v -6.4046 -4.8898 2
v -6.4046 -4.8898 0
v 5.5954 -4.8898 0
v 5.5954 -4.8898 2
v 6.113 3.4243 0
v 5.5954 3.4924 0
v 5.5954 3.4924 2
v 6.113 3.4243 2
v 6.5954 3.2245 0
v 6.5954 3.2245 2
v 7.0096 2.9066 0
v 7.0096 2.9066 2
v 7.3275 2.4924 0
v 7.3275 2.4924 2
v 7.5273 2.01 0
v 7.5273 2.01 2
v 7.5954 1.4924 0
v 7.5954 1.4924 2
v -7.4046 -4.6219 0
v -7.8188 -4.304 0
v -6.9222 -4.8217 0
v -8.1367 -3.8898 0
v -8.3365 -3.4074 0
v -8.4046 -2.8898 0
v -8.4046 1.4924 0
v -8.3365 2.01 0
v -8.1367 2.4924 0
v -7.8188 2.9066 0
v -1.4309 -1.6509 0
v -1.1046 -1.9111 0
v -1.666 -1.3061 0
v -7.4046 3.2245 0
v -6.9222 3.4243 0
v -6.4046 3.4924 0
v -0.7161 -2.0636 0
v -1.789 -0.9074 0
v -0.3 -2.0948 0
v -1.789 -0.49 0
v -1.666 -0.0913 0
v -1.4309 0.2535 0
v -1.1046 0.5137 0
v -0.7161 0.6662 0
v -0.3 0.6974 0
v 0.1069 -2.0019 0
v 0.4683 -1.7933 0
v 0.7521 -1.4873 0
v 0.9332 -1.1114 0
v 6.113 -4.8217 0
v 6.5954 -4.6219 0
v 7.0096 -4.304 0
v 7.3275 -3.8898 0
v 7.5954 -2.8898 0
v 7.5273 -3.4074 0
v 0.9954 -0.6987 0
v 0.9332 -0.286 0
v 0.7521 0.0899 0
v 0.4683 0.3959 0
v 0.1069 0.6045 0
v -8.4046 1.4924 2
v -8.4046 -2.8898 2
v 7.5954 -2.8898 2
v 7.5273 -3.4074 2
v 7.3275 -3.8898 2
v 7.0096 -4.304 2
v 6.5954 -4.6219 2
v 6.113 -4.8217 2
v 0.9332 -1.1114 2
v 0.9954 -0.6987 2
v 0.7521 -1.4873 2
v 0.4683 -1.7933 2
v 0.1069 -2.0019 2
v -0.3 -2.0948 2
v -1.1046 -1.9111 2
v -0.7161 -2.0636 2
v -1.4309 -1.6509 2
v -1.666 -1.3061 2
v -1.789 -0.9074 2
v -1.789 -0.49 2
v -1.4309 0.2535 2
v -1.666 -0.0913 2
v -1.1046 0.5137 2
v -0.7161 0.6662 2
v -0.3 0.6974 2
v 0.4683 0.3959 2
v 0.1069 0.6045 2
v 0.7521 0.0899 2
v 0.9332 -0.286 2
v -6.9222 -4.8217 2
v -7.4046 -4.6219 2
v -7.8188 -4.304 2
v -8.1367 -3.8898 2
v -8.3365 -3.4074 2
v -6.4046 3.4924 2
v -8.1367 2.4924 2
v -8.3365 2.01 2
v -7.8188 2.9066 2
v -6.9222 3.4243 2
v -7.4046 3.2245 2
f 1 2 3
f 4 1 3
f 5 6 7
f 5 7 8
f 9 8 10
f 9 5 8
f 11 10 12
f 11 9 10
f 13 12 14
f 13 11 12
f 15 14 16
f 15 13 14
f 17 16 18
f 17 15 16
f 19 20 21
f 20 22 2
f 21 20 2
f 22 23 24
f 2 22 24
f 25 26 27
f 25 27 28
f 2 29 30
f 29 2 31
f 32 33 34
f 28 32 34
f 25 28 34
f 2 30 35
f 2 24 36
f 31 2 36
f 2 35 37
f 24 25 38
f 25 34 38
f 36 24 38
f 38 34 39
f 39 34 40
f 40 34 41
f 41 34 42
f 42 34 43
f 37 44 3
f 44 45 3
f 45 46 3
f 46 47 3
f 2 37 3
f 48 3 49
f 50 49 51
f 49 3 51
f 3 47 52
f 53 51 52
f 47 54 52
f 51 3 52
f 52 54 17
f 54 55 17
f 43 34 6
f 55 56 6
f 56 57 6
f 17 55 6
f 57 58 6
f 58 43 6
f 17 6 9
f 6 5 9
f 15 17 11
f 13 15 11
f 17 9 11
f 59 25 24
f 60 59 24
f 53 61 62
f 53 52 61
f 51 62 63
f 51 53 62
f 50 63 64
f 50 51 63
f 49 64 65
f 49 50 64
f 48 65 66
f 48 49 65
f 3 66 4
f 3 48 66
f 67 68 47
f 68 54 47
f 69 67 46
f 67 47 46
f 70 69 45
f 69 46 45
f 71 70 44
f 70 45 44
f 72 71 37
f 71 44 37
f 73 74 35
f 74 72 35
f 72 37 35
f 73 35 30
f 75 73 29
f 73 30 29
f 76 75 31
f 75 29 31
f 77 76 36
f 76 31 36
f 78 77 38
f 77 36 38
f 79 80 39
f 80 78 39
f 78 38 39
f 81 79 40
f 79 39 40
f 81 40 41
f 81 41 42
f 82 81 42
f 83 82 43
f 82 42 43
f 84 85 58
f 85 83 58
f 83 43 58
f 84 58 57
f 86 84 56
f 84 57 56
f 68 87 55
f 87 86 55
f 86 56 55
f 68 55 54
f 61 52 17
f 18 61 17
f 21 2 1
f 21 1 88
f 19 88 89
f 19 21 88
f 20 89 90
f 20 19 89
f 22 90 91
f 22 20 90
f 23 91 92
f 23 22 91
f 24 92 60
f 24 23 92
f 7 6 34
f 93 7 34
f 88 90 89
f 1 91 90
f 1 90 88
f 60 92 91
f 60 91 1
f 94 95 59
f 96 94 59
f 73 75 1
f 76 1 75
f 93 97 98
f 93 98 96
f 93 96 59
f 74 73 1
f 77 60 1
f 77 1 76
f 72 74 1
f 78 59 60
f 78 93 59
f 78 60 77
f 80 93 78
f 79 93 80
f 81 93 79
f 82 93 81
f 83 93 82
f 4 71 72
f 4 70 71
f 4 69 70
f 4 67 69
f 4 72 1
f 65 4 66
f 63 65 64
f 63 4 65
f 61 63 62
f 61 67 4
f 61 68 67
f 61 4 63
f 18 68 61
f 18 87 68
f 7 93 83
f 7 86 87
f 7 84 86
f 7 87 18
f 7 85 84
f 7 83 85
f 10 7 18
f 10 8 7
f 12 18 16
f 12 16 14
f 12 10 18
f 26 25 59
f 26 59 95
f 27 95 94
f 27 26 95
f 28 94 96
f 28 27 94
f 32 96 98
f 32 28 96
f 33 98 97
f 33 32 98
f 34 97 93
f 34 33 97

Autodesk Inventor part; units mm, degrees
ref_plane "YZ Plane" through (0, 0, 0) normal (1, 0, 0) x (0, 1, 0)
ref_plane "XZ Plane" through (0, 0, 0) normal (0, 1, 0) x (-1, 0, 0)
ref_plane "XY Plane" through (0, 0, 0) normal (0, 0, 1) x (1, 0, 0)
sketch "washer_sketch" plane through (0, 0, 0) normal (0, 0, 1) x (1, 0, 0)
  arc A0 (0.0668, 4.8898) -> (-1.1152, 4.3995) centre (0.2018, 2.8944) ccw construction
  line L0 (-7.8667, -1.508) -> (-1.1152, 4.3995) construction
  arc A1 (-7.8667, -1.508) -> (-8.5497, -3.0131) centre (-6.5497, -3.0131) ccw construction
  line L1 (-8.5497, -4.8898) -> (-8.5497, -3.0131) construction
  line L2 (8.5497, -4.8898) -> (-8.5497, -4.8898) construction
  line L3 (1.5081, 4.1255) -> (8.5497, -4.8898) construction
  arc A2 (1.5081, 4.1255) -> (0.0668, 4.8898) centre (-0.0681, 2.8944) ccw construction
  circle A3 centre (-0.4046, -0.6987) radius 3.55 construction
  circle A4 centre (-0.4046, -0.6987) radius 3.55 construction
  circle A5 centre (-0.4046, -0.6987) radius 1.4 projected
  line L4 (-6.4046, -4.8898) -> (5.5954, -4.8898)
  line L5 (7.5954, -2.8898) -> (7.5954, 1.4924)
  line L6 (5.5954, 3.4924) -> (-6.4046, 3.4924)
  line L7 (-8.4046, 1.4924) -> (-8.4046, -2.8898)
  arc A6 (-8.4046, -2.8898) -> (-6.4046, -4.8898) centre (-6.4046, -2.8898) ccw
  arc A7 (-6.4046, 3.4924) -> (-8.4046, 1.4924) centre (-6.4046, 1.4924) ccw
  arc A8 (7.5954, 1.4924) -> (5.5954, 3.4924) centre (5.5954, 1.4924) ccw
  arc A9 (5.5954, -4.8898) -> (7.5954, -2.8898) centre (5.5954, -2.8898) ccw
  point P0 (0, 0)
  point P1 (-8.4046, -4.8898)
  point P2 (7.5954, 3.4924)
  point P3 (-8.4046, 3.4924)
  dimension "d0" = 16
  dimension "d1" = 8
  dimension "d2" = 4.1911
  dimension "d3" = 4.1911
  dimension "d4" = 2
extrude "washer" add sketch "washer_sketch" along normal blind 2
equation "\"d1\" = 0.5 * d0"
equation "\"d3\" = d2"
properties part number "mount_linear_stepper_washer"
